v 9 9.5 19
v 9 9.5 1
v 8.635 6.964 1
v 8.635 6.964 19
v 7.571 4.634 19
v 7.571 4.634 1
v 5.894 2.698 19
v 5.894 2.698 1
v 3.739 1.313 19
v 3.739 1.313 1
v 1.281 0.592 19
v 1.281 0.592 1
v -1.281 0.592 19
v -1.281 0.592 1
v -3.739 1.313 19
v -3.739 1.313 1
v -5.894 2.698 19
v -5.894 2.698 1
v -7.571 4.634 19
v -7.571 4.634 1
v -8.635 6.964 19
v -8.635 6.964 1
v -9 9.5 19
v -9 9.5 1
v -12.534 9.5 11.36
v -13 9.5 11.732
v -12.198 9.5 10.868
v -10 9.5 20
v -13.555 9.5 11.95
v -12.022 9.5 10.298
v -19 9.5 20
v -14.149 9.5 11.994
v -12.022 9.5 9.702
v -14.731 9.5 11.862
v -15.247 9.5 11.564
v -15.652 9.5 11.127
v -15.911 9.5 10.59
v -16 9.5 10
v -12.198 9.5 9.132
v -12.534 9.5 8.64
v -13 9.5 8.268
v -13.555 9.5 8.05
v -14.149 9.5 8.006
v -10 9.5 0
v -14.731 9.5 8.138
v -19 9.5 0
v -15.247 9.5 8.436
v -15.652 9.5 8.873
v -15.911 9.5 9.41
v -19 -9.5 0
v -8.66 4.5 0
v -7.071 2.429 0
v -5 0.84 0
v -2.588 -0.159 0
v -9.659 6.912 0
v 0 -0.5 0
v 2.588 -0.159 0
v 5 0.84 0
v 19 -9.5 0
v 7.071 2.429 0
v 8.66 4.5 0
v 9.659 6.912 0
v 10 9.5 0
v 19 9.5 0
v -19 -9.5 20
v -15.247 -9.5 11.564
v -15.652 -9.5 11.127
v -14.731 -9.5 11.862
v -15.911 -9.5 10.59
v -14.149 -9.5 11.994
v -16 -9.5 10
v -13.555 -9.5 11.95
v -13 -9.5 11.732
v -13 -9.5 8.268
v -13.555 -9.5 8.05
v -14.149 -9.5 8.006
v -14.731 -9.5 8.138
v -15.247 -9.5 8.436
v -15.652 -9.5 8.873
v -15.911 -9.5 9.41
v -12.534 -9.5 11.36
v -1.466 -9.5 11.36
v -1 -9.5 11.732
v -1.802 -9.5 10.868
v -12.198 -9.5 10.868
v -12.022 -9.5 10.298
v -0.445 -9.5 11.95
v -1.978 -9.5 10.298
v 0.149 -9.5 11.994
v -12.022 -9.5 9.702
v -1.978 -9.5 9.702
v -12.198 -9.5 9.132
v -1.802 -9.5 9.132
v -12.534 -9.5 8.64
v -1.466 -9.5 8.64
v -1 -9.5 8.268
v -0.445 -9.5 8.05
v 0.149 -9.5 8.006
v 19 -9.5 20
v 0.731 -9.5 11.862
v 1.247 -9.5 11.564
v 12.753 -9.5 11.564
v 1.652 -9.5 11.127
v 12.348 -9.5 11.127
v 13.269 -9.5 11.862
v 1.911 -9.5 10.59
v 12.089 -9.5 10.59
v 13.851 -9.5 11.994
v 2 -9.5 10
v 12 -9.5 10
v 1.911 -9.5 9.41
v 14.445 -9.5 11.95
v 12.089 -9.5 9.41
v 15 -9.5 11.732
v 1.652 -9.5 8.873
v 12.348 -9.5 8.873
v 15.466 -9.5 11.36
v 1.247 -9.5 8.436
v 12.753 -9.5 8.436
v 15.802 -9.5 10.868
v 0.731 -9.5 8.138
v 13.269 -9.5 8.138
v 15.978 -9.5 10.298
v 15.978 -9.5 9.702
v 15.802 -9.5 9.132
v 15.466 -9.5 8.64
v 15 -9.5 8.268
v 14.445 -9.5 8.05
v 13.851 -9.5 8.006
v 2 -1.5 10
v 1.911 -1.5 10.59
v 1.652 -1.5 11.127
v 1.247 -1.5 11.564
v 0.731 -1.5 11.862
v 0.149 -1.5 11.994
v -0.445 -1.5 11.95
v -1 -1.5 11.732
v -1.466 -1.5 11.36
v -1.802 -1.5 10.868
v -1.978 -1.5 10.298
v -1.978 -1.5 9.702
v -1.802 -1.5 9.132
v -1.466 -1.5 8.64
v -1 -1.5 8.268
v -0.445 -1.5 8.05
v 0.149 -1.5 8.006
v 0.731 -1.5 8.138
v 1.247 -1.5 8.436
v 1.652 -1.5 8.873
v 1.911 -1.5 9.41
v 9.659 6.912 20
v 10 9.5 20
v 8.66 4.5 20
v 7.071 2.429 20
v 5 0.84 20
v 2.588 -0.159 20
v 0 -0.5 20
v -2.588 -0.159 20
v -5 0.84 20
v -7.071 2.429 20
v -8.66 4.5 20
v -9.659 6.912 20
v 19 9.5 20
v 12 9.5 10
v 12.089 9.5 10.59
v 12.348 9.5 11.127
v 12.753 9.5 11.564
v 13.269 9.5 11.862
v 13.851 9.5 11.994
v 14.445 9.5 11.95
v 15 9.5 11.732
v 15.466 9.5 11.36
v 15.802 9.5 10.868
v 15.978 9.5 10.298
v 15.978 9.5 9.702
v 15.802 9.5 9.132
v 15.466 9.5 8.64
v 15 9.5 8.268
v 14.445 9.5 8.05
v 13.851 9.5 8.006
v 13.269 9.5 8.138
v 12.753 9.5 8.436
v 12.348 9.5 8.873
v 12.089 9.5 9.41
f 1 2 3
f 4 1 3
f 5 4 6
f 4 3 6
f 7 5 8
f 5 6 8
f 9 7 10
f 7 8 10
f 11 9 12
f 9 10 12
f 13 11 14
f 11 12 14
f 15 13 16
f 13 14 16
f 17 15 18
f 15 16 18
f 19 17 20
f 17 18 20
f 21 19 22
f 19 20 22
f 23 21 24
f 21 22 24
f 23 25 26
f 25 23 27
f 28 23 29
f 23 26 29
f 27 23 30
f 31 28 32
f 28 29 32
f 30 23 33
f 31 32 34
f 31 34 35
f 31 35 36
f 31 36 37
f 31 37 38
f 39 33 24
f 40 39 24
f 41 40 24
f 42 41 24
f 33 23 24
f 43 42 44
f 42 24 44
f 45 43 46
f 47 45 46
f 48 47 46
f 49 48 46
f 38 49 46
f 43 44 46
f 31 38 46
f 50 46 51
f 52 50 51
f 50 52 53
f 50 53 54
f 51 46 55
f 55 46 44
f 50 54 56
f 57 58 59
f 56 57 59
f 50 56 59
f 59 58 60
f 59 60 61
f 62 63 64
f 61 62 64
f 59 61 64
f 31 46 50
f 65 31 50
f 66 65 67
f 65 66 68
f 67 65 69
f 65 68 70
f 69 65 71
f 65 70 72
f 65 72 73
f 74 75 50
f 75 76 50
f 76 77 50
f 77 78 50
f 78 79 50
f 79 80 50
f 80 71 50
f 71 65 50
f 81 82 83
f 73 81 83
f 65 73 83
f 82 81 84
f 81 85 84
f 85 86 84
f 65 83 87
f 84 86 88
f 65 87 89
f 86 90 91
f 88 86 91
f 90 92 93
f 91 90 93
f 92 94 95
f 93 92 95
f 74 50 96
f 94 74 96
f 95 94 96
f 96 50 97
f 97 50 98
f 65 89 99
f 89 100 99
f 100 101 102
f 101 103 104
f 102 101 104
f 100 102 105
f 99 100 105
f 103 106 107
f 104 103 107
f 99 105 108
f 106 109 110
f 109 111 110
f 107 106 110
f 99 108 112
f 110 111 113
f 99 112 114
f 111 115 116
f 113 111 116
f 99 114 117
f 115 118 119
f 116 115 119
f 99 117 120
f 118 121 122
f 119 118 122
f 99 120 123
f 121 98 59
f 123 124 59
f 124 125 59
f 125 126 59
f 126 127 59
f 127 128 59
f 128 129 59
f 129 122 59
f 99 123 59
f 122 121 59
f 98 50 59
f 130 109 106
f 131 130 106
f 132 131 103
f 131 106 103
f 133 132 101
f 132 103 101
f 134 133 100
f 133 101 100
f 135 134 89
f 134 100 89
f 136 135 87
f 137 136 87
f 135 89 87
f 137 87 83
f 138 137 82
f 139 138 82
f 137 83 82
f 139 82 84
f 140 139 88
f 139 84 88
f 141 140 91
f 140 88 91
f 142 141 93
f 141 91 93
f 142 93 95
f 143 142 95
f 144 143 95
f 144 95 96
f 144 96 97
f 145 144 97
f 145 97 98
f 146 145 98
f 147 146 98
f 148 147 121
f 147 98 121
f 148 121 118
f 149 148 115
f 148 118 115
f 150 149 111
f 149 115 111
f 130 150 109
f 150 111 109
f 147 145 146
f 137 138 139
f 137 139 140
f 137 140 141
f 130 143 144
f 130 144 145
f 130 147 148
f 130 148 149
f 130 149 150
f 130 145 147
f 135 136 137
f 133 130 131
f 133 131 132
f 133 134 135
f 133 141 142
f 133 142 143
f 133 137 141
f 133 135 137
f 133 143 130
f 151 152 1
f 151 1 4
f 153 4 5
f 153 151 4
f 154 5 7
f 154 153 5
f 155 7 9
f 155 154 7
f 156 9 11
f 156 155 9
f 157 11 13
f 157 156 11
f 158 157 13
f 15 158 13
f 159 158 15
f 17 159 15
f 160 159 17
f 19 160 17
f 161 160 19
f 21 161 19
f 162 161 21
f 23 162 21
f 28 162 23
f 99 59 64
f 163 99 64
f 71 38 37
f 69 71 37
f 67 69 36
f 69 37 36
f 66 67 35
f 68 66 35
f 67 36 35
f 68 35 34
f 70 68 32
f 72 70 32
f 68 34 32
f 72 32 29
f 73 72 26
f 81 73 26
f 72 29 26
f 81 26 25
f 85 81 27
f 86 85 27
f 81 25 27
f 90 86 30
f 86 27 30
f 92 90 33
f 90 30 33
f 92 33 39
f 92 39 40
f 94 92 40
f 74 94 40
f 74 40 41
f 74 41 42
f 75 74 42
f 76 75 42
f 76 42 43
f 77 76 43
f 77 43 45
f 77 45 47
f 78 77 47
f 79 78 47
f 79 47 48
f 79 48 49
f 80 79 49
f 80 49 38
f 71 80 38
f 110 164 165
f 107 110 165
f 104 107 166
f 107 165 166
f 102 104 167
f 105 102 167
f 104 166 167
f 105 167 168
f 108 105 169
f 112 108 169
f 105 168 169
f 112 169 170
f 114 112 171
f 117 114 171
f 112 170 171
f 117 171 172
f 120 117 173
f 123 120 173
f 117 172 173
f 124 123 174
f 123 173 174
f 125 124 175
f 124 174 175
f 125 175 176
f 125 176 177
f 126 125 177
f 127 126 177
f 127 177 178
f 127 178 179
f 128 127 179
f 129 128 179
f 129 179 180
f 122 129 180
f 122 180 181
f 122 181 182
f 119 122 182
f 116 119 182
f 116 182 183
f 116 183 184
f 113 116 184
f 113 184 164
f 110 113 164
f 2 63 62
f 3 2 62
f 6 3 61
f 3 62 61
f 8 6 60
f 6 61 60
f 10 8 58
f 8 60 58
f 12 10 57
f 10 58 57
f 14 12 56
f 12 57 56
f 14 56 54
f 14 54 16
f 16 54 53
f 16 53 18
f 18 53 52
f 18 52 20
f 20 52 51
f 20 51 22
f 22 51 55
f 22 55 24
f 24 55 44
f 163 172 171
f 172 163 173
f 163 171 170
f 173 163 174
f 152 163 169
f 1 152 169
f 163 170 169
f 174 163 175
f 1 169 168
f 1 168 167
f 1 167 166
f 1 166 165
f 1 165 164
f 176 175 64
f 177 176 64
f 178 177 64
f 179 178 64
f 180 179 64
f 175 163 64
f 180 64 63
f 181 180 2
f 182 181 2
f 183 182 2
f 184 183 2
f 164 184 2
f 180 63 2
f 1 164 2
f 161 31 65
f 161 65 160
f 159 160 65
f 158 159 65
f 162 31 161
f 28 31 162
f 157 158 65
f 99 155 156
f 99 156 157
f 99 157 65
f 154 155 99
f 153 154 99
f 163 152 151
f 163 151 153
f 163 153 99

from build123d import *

# Parameters (mm, degrees)
F1_DEPTH = 20
F2_R     = 2
F3_DEPTH = 19.001
F4_R     = 2
F5_DEPTH = 8
F6_SIZE  = 1


with BuildPart() as f1:
    # F0 (on Top) → F1 (new body)
    with BuildSketch(Plane.XY):
        with BuildLine():
            Line((-9, 9.5), (-19, 9.5))
            Line((-19, 9.5), (-19, -9.5))
            Line((-19, -9.5), (19, -9.5))
            Line((19, -9.5), (19, 9.5))
            Line((19, 9.5), (9, 9.5))
            ThreePointArc((9, 9.5), (0, 0.5), (-9, 9.5))
        make_face()
    extrude(amount=F1_DEPTH)

    # F2 (on face) → F3 (cut, through all)
    with BuildSketch(Plane(origin=(0, 9.5, 0), x_dir=(-1, 0, 0), z_dir=(0, 1, 0))):
        with Locations((-14, 10)):
            Circle(F2_R)
        with Locations((14, 10)):
            Circle(F2_R)
    extrude(amount=-F3_DEPTH, mode=Mode.SUBTRACT)

    # F4 (on face) → F5 (cut)
    with BuildSketch(Plane.XZ.offset(9.5)):
        with Locations((0, 10)):
            Circle(F4_R)
    extrude(amount=-F5_DEPTH, mode=Mode.SUBTRACT)

    # F6
    f6_edges = [f1.edges().sort_by_distance(p)[0] for p in [
        (0, 0.5, 0),
        (0, 0.5, 20),
    ]]
    chamfer(f6_edges, length=F6_SIZE)


solid = f1.part
